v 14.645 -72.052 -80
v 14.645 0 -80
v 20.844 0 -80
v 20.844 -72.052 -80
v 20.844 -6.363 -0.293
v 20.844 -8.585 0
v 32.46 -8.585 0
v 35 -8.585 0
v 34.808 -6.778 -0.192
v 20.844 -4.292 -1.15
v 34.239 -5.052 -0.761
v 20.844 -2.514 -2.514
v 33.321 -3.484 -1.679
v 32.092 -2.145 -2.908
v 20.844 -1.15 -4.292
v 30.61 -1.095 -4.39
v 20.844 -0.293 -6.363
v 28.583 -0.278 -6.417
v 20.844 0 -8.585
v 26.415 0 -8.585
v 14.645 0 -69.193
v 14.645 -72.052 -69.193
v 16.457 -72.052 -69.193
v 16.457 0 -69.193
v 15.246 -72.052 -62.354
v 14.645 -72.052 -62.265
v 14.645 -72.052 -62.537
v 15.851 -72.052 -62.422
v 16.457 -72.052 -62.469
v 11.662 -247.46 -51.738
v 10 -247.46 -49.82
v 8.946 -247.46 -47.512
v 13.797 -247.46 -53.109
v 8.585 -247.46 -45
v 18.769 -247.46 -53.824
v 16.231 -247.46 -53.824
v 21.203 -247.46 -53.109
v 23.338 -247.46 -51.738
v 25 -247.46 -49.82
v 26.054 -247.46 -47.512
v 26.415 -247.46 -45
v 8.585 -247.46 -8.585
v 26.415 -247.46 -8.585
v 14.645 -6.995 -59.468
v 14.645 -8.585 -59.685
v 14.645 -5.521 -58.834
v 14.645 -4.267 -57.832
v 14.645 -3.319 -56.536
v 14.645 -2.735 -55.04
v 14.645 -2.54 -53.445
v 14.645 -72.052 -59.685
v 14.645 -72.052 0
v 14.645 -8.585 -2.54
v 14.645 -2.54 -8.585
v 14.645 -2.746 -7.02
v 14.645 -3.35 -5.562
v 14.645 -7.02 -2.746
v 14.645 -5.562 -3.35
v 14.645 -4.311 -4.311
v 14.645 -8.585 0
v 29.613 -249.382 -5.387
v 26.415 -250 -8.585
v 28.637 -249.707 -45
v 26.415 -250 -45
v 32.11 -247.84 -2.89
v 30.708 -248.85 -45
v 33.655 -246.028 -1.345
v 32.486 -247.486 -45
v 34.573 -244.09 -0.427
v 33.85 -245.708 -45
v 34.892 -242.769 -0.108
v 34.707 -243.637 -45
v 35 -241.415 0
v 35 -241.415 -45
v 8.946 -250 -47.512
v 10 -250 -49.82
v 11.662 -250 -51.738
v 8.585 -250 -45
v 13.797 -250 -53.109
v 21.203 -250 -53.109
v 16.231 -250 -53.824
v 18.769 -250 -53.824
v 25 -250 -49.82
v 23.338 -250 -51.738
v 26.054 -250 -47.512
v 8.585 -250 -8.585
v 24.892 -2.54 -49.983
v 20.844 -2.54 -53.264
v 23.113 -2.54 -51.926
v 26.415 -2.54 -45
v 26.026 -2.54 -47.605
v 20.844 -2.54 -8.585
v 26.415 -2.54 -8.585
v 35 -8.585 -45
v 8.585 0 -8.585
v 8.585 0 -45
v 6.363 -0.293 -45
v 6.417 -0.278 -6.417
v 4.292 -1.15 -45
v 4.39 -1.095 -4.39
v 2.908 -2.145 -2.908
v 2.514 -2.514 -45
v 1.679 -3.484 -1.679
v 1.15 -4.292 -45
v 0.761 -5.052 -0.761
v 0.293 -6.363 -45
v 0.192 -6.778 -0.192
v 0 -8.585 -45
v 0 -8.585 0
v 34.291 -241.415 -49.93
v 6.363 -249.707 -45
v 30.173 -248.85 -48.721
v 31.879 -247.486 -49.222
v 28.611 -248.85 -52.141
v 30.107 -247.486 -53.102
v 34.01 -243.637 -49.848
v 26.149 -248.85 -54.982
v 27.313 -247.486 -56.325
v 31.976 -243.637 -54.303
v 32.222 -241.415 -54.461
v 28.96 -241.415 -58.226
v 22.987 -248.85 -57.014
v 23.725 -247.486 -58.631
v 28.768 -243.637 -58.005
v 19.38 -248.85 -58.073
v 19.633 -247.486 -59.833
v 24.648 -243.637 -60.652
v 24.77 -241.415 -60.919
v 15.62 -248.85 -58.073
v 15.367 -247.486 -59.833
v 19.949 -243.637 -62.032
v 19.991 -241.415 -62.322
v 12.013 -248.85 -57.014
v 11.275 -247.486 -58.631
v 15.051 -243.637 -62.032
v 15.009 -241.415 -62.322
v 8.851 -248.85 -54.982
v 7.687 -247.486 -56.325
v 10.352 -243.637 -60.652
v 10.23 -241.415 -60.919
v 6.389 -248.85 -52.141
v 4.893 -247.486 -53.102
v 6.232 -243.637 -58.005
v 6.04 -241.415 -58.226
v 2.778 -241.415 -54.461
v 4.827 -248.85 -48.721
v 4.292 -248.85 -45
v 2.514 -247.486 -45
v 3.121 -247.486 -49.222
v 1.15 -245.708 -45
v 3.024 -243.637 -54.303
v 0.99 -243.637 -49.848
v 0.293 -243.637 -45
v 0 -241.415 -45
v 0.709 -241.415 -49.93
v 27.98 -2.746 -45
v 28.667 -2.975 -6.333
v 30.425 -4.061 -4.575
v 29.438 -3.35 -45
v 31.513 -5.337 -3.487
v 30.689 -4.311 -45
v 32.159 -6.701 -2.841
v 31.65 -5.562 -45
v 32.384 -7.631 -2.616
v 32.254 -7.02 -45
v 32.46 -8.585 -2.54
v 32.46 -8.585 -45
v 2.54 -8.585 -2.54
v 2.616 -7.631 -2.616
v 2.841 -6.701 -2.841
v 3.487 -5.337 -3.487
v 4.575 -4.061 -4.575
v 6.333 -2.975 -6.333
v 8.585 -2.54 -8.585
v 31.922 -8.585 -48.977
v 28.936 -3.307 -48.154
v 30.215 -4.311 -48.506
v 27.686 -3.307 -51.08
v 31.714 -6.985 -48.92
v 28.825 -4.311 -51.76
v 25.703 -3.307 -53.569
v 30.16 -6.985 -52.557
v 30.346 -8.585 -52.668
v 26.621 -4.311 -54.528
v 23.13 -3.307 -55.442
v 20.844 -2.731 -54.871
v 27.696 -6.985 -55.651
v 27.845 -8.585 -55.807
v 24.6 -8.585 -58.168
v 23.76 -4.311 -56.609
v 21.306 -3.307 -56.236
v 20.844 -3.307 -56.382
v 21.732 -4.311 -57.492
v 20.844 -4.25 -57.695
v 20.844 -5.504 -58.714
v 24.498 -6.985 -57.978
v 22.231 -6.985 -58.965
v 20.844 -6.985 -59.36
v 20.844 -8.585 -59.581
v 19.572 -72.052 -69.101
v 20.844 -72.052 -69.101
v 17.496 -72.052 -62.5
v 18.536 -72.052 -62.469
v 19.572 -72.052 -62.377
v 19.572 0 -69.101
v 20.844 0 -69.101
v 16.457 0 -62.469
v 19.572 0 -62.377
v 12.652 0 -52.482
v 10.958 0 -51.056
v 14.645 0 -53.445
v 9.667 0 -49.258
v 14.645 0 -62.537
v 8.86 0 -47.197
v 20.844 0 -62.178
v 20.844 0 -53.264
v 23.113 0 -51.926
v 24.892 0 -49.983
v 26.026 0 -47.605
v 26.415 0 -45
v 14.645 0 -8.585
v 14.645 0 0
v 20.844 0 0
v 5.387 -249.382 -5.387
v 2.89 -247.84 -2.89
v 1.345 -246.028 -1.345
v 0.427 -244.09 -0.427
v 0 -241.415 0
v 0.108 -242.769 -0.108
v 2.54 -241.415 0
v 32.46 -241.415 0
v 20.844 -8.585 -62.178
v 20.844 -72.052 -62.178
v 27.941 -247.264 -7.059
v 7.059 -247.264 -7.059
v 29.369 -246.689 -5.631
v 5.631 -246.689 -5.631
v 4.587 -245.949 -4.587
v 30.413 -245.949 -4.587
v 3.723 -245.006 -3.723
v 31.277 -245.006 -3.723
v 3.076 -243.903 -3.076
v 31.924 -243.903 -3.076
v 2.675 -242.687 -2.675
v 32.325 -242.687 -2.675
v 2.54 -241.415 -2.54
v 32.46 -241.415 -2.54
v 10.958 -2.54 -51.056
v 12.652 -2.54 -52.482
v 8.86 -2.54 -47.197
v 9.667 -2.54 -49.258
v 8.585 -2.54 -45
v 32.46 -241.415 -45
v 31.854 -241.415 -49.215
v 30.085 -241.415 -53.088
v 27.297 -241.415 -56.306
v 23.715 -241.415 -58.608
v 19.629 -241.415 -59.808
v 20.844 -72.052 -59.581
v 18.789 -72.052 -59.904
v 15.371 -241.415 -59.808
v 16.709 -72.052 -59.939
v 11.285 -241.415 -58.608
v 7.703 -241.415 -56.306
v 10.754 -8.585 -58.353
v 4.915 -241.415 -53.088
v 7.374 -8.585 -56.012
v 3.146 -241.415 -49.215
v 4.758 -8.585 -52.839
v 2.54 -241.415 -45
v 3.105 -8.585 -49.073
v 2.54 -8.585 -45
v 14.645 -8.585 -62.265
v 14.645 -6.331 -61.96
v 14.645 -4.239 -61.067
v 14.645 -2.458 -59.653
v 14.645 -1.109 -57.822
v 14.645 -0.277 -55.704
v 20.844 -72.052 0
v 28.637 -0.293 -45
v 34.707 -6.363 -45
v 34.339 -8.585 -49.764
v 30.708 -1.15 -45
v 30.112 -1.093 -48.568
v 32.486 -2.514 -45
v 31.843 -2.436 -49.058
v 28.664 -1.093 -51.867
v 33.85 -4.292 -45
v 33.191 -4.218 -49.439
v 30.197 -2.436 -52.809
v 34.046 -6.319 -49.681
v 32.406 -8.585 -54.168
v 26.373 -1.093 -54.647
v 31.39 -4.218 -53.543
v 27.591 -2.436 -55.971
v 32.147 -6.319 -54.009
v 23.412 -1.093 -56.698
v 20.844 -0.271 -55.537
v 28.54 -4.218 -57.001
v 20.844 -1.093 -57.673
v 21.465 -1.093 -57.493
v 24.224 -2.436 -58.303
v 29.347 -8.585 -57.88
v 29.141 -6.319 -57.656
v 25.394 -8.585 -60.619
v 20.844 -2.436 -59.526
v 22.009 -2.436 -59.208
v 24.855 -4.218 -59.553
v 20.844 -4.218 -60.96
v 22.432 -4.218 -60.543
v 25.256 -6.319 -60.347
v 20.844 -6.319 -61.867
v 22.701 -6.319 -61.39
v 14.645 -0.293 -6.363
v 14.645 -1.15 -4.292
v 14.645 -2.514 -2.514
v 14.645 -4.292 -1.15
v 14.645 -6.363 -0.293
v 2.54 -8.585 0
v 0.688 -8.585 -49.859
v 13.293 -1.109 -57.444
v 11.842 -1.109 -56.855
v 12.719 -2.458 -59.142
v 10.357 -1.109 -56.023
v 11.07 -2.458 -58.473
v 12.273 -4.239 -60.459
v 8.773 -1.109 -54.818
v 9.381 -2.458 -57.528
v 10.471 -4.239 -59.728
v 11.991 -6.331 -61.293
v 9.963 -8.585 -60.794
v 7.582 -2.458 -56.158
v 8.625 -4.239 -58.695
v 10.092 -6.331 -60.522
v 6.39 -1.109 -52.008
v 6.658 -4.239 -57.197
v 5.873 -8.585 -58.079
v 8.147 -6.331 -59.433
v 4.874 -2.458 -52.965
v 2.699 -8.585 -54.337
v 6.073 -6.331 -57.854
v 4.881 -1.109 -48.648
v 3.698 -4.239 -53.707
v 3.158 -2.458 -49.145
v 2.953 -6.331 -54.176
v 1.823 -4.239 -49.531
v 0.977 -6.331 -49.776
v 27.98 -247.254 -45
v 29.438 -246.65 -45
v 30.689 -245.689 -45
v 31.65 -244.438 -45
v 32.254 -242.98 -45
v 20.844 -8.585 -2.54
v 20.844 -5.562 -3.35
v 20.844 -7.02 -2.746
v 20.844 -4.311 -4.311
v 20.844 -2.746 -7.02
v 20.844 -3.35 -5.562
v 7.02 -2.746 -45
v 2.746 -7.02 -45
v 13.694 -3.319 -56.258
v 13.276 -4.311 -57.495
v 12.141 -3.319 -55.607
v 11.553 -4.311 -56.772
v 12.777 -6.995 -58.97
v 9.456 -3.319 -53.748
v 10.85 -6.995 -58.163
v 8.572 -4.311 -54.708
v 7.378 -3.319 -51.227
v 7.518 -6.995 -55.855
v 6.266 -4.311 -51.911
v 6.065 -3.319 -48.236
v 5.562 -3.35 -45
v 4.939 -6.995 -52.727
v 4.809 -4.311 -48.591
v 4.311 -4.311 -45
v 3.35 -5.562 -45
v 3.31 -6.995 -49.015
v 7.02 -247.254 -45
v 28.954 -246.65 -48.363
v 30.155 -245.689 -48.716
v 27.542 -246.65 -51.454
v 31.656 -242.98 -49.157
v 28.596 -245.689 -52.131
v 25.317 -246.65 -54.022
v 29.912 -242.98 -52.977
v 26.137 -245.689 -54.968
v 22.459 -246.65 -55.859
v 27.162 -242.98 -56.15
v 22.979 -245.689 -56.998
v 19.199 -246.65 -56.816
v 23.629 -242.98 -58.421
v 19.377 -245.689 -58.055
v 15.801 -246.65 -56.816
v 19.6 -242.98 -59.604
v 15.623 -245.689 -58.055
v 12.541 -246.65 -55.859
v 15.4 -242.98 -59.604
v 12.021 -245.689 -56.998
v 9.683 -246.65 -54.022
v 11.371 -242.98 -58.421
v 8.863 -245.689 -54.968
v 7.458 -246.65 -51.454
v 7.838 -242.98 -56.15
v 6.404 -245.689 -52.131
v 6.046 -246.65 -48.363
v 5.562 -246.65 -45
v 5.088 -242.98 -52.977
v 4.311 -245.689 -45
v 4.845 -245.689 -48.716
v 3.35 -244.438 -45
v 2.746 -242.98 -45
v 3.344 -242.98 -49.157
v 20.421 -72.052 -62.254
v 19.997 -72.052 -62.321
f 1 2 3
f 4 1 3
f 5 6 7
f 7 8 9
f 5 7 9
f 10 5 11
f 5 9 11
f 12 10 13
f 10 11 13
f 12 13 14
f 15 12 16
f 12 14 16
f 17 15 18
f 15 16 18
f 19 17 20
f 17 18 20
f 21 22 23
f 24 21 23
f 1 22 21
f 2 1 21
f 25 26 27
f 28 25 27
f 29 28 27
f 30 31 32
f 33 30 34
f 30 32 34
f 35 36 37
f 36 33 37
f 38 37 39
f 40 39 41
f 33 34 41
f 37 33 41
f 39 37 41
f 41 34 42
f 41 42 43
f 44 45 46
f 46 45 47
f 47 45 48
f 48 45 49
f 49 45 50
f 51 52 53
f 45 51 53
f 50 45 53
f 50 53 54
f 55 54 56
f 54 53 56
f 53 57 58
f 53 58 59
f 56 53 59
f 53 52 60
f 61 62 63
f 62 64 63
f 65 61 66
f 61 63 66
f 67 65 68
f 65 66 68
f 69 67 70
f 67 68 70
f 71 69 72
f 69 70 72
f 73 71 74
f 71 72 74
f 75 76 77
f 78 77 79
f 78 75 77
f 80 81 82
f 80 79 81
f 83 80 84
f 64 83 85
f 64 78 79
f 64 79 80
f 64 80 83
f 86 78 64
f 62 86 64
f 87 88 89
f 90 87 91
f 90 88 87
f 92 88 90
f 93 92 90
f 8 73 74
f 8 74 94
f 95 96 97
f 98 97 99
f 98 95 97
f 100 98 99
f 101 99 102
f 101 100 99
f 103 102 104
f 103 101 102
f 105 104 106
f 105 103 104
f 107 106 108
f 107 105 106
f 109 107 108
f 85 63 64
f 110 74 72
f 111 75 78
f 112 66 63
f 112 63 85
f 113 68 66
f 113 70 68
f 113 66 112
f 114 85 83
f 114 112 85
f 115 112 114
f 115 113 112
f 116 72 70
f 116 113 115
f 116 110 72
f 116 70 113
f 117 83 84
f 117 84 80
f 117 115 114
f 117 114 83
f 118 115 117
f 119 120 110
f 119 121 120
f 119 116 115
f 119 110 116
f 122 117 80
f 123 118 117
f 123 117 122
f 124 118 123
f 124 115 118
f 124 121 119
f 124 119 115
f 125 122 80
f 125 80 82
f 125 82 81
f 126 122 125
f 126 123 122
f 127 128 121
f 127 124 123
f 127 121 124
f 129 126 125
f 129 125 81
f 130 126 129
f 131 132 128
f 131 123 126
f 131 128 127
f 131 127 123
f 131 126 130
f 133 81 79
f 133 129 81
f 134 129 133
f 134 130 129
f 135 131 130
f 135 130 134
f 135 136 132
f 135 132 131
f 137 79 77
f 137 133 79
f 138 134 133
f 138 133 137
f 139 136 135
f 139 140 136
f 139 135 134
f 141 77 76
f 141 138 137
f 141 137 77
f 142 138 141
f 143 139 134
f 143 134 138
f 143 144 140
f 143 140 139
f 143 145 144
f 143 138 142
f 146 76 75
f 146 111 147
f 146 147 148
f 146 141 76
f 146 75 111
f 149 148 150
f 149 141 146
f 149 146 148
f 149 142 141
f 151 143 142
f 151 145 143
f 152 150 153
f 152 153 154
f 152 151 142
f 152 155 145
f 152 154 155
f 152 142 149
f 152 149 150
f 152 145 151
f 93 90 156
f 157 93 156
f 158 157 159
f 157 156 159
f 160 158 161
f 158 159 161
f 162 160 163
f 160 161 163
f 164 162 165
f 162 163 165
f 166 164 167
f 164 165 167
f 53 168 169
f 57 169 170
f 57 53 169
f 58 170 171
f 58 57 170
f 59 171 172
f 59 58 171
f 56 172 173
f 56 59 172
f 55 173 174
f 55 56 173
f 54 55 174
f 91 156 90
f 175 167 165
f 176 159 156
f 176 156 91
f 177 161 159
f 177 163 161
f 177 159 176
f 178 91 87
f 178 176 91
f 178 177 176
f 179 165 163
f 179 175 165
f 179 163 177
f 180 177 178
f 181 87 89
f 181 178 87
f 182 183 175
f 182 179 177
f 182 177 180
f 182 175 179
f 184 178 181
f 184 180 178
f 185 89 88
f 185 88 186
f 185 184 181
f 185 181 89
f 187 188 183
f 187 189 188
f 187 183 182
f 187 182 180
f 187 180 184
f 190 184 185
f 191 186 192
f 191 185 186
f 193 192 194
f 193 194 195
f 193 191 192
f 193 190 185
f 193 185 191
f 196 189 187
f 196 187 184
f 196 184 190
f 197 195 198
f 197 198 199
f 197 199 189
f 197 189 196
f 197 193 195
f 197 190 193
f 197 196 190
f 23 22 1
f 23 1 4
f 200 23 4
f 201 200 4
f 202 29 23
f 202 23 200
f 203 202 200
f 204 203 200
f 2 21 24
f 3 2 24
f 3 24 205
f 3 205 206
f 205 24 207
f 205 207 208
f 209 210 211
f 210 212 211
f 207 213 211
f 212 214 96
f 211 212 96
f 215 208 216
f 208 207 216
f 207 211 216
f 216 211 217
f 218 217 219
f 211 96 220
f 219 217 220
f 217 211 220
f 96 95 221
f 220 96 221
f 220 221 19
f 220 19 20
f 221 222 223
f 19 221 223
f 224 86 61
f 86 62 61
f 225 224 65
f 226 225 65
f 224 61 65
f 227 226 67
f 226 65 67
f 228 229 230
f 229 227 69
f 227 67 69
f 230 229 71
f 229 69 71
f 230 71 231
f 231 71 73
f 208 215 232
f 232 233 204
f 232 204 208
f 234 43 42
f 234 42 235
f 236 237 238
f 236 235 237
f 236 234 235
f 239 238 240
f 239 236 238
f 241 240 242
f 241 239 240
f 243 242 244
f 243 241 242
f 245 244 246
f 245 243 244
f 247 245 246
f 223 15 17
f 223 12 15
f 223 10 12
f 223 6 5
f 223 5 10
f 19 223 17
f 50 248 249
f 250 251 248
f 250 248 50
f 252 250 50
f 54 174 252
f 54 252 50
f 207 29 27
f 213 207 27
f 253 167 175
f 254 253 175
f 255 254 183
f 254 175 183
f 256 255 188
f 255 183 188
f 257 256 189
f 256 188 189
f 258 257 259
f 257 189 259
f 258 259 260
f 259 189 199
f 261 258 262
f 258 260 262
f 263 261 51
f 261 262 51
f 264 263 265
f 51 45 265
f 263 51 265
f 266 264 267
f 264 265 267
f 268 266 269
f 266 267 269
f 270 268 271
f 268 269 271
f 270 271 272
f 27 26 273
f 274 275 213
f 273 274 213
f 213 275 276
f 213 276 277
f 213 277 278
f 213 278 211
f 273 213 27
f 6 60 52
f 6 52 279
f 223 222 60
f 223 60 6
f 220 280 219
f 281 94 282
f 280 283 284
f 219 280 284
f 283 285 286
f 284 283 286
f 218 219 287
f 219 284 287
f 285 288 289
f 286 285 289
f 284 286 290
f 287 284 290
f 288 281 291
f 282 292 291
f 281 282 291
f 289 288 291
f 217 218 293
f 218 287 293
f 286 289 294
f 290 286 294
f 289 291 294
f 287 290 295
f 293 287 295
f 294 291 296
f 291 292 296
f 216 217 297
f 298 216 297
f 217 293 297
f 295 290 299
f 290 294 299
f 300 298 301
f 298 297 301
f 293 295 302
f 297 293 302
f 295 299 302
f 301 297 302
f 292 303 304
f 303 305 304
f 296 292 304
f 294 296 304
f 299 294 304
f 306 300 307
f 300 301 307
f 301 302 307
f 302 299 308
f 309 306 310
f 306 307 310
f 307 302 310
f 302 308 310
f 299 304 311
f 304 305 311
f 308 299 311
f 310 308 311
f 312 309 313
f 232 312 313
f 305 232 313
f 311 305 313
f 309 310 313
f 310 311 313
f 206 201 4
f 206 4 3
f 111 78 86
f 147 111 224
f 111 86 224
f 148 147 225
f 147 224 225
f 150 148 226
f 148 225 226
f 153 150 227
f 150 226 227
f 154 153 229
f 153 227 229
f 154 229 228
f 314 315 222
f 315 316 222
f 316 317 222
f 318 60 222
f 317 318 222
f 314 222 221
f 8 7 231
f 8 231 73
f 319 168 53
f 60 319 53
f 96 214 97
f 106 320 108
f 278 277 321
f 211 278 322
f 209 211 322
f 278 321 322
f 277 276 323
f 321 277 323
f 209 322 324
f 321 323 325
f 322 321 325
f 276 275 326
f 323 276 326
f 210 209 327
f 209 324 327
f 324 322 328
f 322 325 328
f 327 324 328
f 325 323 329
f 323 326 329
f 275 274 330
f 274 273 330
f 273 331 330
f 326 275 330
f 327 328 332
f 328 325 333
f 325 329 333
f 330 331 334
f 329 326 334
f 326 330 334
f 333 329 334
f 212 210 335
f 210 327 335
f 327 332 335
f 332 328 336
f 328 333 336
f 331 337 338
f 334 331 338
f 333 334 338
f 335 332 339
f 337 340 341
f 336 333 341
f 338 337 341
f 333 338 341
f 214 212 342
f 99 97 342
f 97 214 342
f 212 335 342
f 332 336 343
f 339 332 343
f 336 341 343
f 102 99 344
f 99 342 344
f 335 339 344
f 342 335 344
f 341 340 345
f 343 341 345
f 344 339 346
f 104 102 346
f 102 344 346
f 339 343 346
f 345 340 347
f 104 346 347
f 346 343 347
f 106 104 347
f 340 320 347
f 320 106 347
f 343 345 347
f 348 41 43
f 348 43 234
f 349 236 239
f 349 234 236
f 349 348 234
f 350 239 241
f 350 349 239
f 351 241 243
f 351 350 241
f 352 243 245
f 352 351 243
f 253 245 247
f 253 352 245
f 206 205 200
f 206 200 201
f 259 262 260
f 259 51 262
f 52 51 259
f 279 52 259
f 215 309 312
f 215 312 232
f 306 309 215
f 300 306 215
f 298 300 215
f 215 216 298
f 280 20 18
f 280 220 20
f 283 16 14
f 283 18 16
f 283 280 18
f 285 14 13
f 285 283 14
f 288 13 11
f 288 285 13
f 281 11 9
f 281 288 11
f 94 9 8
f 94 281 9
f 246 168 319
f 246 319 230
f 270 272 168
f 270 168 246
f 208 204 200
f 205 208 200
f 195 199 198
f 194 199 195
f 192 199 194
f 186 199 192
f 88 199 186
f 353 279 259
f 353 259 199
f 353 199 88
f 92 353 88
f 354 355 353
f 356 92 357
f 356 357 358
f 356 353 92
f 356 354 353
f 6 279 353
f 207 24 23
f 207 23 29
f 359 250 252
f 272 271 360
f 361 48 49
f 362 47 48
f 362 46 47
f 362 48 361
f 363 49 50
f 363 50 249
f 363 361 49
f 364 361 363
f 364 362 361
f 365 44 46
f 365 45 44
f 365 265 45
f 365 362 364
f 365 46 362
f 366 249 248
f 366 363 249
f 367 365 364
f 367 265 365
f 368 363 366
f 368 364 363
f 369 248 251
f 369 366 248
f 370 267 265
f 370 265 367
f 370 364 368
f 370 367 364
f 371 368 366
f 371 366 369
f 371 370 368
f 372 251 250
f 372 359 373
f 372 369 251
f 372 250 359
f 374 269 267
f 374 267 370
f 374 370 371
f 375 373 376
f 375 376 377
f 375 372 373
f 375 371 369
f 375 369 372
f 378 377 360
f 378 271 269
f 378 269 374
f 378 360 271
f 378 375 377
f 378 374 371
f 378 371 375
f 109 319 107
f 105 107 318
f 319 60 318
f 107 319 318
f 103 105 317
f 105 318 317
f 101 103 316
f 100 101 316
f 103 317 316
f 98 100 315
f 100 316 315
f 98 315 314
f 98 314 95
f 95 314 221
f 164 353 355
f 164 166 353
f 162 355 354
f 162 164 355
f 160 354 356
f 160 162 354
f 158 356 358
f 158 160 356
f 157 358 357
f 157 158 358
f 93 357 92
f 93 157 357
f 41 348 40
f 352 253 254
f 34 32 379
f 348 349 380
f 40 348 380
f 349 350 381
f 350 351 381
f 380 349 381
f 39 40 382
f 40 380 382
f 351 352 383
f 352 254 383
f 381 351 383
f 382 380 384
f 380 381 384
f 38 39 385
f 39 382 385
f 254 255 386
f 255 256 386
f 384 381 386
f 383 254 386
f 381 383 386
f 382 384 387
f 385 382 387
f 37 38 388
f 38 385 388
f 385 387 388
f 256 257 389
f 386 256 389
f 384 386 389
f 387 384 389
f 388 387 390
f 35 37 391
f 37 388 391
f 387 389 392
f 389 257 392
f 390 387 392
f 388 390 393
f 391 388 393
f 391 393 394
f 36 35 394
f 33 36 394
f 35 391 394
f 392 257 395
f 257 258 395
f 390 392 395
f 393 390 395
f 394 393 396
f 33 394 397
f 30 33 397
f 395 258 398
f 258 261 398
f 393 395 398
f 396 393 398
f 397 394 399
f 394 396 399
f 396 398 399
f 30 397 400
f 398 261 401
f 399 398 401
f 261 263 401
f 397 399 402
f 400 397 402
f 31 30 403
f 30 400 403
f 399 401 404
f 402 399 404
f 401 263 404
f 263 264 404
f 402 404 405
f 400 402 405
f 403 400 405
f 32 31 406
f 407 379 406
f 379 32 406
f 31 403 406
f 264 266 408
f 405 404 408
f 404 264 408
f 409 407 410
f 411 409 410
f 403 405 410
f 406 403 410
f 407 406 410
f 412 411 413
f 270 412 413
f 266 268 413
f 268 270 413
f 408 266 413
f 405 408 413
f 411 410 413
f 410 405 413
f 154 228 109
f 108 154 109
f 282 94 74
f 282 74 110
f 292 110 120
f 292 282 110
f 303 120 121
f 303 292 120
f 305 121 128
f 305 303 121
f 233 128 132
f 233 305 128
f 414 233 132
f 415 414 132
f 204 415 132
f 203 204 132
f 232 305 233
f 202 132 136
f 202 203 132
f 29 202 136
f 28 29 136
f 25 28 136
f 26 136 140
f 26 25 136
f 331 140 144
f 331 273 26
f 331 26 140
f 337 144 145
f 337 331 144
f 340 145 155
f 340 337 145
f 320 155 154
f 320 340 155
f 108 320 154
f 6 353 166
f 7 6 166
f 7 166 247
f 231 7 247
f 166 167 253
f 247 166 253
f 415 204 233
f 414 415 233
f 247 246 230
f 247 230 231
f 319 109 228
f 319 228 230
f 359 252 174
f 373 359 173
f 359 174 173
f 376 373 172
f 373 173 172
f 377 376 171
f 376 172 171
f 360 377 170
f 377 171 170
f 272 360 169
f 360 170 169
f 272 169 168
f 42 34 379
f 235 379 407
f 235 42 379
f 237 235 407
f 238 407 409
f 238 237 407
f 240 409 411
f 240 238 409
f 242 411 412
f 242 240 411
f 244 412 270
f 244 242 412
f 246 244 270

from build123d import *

# Parameters (mm, degrees)
F0_W      = 35
F0_H      = 250
F1_DEPTH  = 45
F3_DEPTH  = 250
F4_DEPTH  = 250
F5_R      = 8.5849434278
F6_T      = -2.54
F7_W      = 6.1992760748
F7_H      = 72.0517709851
F8_DEPTH  = 80
F10_DEPTH = 101.346


# Not quite as in the source:
# - a shell that OpenCascade refuses in one call is made with other operations: the cavity is built on its own and cut out
# - a feature names something its author has since deleted; it is built from what else it names


with BuildPart() as f1:
    # F0 (on Top) → F1 (new body)
    with BuildSketch(Plane.XY):
        with Locations((17.5, -125)):
            Rectangle(F0_W, F0_H)
    extrude(amount=-F1_DEPTH)

    # F2 (on face) → F3 (join)
    with BuildSketch(Plane(origin=(0, 0, 0), x_dir=(-1, 0, 0), z_dir=(0, 1, 0))):
        with BuildLine():
            Line((-17.5, -45), (0, -45))
            ThreePointArc((0, -45), (-5.1256313292, -32.6256313292), (-17.5, -27.5))
            ThreePointArc((-17.5, -27.5), (-29.8743686708, -32.6256313292), (-35, -45))
            Line((-35, -45), (-17.5, -45))
        make_face()
        with BuildLine():
            ThreePointArc((-35, -45), (-17.5, -62.5), (0, -45))
            Line((0, -45), (-17.5, -45))
            Line((-17.5, -45), (-35, -45))
        make_face()
        with BuildLine():
            ThreePointArc((-17.5, -27.5), (-5.1256313292, -32.6256313292), (0, -45))
            Line((0, -45), (0, -27.5))
            Line((0, -27.5), (-17.5, -27.5))
        make_face()
    extrude(amount=-F3_DEPTH)

    # F2 (on face) → F4 (join)
    with BuildSketch(Plane(origin=(0, 0, 0), x_dir=(-1, 0, 0), z_dir=(0, 1, 0))):
        with BuildLine():
            Line((-17.5, -45), (0, -45))
            ThreePointArc((0, -45), (-5.1256313292, -32.6256313292), (-17.5, -27.5))
            ThreePointArc((-17.5, -27.5), (-29.8743686708, -32.6256313292), (-35, -45))
            Line((-35, -45), (-17.5, -45))
        make_face()
        with BuildLine():
            ThreePointArc((-35, -45), (-17.5, -62.5), (0, -45))
            Line((0, -45), (-17.5, -45))
            Line((-17.5, -45), (-35, -45))
        make_face()
        with BuildLine():
            ThreePointArc((-17.5, -27.5), (-5.1256313292, -32.6256313292), (0, -45))
            Line((0, -45), (0, -27.5))
            Line((0, -27.5), (-17.5, -27.5))
        make_face()
    extrude(amount=-F4_DEPTH)

    # F5
    f5_edges = [f1.edges().sort_by_distance(p)[0] for p in [
        (17.5, 0, 0),
        (35, 0, -22.5),
        (17.5, 0, -62.5),
        (0, 0, -22.5),
        (17.5, -250, 0),
        (0, -250, -22.5),
        (17.5, -250, -62.5),
        (35, -250, -22.5),
    ]]
    fillet(f5_edges, radius=F5_R)

    # F6: a shell. OpenCascade refuses it in one call, so the cavity is built on its own and cut out:
    # the body offset inwards by the wall thickness, plus a prism from it out through each open face.
    f6_core = offset(f1.part, amount=F6_T, mode=Mode.PRIVATE)
    f6_exits = [f6_core.faces().sort_by_distance(p)[0] for p in [
        (17.5, -125, -2.54),
    ]]
    add(f6_core, mode=Mode.SUBTRACT)
    extrude(f6_exits, amount=-F6_T, mode=Mode.SUBTRACT)

    # F7 (on Top) → F8 (join)
    with BuildSketch(Plane.XY):
        with Locations((17.7442375571, -36.0258854926)):
            Rectangle(F7_W, F7_H)
    extrude(amount=-F8_DEPTH)

    # F9 (on face) → F10 (cut)
    with BuildSketch(Plane.XZ.offset(72.0517709851)):
        Polygon((16.4569599832, -69.1932439804), (16.4569599832, -62.46888856), (14.6445995197, -62.5368878245), (14.6445995197, -69.1932439804), align=None)
        Polygon((20.8438755944, -62.1775579175), (19.5716265936, -62.376949193), (19.5716265936, -69.1005588385), (20.8438755944, -69.1005588385), align=None)
    extrude(amount=-F10_DEPTH, mode=Mode.SUBTRACT)


solid = f1.part
